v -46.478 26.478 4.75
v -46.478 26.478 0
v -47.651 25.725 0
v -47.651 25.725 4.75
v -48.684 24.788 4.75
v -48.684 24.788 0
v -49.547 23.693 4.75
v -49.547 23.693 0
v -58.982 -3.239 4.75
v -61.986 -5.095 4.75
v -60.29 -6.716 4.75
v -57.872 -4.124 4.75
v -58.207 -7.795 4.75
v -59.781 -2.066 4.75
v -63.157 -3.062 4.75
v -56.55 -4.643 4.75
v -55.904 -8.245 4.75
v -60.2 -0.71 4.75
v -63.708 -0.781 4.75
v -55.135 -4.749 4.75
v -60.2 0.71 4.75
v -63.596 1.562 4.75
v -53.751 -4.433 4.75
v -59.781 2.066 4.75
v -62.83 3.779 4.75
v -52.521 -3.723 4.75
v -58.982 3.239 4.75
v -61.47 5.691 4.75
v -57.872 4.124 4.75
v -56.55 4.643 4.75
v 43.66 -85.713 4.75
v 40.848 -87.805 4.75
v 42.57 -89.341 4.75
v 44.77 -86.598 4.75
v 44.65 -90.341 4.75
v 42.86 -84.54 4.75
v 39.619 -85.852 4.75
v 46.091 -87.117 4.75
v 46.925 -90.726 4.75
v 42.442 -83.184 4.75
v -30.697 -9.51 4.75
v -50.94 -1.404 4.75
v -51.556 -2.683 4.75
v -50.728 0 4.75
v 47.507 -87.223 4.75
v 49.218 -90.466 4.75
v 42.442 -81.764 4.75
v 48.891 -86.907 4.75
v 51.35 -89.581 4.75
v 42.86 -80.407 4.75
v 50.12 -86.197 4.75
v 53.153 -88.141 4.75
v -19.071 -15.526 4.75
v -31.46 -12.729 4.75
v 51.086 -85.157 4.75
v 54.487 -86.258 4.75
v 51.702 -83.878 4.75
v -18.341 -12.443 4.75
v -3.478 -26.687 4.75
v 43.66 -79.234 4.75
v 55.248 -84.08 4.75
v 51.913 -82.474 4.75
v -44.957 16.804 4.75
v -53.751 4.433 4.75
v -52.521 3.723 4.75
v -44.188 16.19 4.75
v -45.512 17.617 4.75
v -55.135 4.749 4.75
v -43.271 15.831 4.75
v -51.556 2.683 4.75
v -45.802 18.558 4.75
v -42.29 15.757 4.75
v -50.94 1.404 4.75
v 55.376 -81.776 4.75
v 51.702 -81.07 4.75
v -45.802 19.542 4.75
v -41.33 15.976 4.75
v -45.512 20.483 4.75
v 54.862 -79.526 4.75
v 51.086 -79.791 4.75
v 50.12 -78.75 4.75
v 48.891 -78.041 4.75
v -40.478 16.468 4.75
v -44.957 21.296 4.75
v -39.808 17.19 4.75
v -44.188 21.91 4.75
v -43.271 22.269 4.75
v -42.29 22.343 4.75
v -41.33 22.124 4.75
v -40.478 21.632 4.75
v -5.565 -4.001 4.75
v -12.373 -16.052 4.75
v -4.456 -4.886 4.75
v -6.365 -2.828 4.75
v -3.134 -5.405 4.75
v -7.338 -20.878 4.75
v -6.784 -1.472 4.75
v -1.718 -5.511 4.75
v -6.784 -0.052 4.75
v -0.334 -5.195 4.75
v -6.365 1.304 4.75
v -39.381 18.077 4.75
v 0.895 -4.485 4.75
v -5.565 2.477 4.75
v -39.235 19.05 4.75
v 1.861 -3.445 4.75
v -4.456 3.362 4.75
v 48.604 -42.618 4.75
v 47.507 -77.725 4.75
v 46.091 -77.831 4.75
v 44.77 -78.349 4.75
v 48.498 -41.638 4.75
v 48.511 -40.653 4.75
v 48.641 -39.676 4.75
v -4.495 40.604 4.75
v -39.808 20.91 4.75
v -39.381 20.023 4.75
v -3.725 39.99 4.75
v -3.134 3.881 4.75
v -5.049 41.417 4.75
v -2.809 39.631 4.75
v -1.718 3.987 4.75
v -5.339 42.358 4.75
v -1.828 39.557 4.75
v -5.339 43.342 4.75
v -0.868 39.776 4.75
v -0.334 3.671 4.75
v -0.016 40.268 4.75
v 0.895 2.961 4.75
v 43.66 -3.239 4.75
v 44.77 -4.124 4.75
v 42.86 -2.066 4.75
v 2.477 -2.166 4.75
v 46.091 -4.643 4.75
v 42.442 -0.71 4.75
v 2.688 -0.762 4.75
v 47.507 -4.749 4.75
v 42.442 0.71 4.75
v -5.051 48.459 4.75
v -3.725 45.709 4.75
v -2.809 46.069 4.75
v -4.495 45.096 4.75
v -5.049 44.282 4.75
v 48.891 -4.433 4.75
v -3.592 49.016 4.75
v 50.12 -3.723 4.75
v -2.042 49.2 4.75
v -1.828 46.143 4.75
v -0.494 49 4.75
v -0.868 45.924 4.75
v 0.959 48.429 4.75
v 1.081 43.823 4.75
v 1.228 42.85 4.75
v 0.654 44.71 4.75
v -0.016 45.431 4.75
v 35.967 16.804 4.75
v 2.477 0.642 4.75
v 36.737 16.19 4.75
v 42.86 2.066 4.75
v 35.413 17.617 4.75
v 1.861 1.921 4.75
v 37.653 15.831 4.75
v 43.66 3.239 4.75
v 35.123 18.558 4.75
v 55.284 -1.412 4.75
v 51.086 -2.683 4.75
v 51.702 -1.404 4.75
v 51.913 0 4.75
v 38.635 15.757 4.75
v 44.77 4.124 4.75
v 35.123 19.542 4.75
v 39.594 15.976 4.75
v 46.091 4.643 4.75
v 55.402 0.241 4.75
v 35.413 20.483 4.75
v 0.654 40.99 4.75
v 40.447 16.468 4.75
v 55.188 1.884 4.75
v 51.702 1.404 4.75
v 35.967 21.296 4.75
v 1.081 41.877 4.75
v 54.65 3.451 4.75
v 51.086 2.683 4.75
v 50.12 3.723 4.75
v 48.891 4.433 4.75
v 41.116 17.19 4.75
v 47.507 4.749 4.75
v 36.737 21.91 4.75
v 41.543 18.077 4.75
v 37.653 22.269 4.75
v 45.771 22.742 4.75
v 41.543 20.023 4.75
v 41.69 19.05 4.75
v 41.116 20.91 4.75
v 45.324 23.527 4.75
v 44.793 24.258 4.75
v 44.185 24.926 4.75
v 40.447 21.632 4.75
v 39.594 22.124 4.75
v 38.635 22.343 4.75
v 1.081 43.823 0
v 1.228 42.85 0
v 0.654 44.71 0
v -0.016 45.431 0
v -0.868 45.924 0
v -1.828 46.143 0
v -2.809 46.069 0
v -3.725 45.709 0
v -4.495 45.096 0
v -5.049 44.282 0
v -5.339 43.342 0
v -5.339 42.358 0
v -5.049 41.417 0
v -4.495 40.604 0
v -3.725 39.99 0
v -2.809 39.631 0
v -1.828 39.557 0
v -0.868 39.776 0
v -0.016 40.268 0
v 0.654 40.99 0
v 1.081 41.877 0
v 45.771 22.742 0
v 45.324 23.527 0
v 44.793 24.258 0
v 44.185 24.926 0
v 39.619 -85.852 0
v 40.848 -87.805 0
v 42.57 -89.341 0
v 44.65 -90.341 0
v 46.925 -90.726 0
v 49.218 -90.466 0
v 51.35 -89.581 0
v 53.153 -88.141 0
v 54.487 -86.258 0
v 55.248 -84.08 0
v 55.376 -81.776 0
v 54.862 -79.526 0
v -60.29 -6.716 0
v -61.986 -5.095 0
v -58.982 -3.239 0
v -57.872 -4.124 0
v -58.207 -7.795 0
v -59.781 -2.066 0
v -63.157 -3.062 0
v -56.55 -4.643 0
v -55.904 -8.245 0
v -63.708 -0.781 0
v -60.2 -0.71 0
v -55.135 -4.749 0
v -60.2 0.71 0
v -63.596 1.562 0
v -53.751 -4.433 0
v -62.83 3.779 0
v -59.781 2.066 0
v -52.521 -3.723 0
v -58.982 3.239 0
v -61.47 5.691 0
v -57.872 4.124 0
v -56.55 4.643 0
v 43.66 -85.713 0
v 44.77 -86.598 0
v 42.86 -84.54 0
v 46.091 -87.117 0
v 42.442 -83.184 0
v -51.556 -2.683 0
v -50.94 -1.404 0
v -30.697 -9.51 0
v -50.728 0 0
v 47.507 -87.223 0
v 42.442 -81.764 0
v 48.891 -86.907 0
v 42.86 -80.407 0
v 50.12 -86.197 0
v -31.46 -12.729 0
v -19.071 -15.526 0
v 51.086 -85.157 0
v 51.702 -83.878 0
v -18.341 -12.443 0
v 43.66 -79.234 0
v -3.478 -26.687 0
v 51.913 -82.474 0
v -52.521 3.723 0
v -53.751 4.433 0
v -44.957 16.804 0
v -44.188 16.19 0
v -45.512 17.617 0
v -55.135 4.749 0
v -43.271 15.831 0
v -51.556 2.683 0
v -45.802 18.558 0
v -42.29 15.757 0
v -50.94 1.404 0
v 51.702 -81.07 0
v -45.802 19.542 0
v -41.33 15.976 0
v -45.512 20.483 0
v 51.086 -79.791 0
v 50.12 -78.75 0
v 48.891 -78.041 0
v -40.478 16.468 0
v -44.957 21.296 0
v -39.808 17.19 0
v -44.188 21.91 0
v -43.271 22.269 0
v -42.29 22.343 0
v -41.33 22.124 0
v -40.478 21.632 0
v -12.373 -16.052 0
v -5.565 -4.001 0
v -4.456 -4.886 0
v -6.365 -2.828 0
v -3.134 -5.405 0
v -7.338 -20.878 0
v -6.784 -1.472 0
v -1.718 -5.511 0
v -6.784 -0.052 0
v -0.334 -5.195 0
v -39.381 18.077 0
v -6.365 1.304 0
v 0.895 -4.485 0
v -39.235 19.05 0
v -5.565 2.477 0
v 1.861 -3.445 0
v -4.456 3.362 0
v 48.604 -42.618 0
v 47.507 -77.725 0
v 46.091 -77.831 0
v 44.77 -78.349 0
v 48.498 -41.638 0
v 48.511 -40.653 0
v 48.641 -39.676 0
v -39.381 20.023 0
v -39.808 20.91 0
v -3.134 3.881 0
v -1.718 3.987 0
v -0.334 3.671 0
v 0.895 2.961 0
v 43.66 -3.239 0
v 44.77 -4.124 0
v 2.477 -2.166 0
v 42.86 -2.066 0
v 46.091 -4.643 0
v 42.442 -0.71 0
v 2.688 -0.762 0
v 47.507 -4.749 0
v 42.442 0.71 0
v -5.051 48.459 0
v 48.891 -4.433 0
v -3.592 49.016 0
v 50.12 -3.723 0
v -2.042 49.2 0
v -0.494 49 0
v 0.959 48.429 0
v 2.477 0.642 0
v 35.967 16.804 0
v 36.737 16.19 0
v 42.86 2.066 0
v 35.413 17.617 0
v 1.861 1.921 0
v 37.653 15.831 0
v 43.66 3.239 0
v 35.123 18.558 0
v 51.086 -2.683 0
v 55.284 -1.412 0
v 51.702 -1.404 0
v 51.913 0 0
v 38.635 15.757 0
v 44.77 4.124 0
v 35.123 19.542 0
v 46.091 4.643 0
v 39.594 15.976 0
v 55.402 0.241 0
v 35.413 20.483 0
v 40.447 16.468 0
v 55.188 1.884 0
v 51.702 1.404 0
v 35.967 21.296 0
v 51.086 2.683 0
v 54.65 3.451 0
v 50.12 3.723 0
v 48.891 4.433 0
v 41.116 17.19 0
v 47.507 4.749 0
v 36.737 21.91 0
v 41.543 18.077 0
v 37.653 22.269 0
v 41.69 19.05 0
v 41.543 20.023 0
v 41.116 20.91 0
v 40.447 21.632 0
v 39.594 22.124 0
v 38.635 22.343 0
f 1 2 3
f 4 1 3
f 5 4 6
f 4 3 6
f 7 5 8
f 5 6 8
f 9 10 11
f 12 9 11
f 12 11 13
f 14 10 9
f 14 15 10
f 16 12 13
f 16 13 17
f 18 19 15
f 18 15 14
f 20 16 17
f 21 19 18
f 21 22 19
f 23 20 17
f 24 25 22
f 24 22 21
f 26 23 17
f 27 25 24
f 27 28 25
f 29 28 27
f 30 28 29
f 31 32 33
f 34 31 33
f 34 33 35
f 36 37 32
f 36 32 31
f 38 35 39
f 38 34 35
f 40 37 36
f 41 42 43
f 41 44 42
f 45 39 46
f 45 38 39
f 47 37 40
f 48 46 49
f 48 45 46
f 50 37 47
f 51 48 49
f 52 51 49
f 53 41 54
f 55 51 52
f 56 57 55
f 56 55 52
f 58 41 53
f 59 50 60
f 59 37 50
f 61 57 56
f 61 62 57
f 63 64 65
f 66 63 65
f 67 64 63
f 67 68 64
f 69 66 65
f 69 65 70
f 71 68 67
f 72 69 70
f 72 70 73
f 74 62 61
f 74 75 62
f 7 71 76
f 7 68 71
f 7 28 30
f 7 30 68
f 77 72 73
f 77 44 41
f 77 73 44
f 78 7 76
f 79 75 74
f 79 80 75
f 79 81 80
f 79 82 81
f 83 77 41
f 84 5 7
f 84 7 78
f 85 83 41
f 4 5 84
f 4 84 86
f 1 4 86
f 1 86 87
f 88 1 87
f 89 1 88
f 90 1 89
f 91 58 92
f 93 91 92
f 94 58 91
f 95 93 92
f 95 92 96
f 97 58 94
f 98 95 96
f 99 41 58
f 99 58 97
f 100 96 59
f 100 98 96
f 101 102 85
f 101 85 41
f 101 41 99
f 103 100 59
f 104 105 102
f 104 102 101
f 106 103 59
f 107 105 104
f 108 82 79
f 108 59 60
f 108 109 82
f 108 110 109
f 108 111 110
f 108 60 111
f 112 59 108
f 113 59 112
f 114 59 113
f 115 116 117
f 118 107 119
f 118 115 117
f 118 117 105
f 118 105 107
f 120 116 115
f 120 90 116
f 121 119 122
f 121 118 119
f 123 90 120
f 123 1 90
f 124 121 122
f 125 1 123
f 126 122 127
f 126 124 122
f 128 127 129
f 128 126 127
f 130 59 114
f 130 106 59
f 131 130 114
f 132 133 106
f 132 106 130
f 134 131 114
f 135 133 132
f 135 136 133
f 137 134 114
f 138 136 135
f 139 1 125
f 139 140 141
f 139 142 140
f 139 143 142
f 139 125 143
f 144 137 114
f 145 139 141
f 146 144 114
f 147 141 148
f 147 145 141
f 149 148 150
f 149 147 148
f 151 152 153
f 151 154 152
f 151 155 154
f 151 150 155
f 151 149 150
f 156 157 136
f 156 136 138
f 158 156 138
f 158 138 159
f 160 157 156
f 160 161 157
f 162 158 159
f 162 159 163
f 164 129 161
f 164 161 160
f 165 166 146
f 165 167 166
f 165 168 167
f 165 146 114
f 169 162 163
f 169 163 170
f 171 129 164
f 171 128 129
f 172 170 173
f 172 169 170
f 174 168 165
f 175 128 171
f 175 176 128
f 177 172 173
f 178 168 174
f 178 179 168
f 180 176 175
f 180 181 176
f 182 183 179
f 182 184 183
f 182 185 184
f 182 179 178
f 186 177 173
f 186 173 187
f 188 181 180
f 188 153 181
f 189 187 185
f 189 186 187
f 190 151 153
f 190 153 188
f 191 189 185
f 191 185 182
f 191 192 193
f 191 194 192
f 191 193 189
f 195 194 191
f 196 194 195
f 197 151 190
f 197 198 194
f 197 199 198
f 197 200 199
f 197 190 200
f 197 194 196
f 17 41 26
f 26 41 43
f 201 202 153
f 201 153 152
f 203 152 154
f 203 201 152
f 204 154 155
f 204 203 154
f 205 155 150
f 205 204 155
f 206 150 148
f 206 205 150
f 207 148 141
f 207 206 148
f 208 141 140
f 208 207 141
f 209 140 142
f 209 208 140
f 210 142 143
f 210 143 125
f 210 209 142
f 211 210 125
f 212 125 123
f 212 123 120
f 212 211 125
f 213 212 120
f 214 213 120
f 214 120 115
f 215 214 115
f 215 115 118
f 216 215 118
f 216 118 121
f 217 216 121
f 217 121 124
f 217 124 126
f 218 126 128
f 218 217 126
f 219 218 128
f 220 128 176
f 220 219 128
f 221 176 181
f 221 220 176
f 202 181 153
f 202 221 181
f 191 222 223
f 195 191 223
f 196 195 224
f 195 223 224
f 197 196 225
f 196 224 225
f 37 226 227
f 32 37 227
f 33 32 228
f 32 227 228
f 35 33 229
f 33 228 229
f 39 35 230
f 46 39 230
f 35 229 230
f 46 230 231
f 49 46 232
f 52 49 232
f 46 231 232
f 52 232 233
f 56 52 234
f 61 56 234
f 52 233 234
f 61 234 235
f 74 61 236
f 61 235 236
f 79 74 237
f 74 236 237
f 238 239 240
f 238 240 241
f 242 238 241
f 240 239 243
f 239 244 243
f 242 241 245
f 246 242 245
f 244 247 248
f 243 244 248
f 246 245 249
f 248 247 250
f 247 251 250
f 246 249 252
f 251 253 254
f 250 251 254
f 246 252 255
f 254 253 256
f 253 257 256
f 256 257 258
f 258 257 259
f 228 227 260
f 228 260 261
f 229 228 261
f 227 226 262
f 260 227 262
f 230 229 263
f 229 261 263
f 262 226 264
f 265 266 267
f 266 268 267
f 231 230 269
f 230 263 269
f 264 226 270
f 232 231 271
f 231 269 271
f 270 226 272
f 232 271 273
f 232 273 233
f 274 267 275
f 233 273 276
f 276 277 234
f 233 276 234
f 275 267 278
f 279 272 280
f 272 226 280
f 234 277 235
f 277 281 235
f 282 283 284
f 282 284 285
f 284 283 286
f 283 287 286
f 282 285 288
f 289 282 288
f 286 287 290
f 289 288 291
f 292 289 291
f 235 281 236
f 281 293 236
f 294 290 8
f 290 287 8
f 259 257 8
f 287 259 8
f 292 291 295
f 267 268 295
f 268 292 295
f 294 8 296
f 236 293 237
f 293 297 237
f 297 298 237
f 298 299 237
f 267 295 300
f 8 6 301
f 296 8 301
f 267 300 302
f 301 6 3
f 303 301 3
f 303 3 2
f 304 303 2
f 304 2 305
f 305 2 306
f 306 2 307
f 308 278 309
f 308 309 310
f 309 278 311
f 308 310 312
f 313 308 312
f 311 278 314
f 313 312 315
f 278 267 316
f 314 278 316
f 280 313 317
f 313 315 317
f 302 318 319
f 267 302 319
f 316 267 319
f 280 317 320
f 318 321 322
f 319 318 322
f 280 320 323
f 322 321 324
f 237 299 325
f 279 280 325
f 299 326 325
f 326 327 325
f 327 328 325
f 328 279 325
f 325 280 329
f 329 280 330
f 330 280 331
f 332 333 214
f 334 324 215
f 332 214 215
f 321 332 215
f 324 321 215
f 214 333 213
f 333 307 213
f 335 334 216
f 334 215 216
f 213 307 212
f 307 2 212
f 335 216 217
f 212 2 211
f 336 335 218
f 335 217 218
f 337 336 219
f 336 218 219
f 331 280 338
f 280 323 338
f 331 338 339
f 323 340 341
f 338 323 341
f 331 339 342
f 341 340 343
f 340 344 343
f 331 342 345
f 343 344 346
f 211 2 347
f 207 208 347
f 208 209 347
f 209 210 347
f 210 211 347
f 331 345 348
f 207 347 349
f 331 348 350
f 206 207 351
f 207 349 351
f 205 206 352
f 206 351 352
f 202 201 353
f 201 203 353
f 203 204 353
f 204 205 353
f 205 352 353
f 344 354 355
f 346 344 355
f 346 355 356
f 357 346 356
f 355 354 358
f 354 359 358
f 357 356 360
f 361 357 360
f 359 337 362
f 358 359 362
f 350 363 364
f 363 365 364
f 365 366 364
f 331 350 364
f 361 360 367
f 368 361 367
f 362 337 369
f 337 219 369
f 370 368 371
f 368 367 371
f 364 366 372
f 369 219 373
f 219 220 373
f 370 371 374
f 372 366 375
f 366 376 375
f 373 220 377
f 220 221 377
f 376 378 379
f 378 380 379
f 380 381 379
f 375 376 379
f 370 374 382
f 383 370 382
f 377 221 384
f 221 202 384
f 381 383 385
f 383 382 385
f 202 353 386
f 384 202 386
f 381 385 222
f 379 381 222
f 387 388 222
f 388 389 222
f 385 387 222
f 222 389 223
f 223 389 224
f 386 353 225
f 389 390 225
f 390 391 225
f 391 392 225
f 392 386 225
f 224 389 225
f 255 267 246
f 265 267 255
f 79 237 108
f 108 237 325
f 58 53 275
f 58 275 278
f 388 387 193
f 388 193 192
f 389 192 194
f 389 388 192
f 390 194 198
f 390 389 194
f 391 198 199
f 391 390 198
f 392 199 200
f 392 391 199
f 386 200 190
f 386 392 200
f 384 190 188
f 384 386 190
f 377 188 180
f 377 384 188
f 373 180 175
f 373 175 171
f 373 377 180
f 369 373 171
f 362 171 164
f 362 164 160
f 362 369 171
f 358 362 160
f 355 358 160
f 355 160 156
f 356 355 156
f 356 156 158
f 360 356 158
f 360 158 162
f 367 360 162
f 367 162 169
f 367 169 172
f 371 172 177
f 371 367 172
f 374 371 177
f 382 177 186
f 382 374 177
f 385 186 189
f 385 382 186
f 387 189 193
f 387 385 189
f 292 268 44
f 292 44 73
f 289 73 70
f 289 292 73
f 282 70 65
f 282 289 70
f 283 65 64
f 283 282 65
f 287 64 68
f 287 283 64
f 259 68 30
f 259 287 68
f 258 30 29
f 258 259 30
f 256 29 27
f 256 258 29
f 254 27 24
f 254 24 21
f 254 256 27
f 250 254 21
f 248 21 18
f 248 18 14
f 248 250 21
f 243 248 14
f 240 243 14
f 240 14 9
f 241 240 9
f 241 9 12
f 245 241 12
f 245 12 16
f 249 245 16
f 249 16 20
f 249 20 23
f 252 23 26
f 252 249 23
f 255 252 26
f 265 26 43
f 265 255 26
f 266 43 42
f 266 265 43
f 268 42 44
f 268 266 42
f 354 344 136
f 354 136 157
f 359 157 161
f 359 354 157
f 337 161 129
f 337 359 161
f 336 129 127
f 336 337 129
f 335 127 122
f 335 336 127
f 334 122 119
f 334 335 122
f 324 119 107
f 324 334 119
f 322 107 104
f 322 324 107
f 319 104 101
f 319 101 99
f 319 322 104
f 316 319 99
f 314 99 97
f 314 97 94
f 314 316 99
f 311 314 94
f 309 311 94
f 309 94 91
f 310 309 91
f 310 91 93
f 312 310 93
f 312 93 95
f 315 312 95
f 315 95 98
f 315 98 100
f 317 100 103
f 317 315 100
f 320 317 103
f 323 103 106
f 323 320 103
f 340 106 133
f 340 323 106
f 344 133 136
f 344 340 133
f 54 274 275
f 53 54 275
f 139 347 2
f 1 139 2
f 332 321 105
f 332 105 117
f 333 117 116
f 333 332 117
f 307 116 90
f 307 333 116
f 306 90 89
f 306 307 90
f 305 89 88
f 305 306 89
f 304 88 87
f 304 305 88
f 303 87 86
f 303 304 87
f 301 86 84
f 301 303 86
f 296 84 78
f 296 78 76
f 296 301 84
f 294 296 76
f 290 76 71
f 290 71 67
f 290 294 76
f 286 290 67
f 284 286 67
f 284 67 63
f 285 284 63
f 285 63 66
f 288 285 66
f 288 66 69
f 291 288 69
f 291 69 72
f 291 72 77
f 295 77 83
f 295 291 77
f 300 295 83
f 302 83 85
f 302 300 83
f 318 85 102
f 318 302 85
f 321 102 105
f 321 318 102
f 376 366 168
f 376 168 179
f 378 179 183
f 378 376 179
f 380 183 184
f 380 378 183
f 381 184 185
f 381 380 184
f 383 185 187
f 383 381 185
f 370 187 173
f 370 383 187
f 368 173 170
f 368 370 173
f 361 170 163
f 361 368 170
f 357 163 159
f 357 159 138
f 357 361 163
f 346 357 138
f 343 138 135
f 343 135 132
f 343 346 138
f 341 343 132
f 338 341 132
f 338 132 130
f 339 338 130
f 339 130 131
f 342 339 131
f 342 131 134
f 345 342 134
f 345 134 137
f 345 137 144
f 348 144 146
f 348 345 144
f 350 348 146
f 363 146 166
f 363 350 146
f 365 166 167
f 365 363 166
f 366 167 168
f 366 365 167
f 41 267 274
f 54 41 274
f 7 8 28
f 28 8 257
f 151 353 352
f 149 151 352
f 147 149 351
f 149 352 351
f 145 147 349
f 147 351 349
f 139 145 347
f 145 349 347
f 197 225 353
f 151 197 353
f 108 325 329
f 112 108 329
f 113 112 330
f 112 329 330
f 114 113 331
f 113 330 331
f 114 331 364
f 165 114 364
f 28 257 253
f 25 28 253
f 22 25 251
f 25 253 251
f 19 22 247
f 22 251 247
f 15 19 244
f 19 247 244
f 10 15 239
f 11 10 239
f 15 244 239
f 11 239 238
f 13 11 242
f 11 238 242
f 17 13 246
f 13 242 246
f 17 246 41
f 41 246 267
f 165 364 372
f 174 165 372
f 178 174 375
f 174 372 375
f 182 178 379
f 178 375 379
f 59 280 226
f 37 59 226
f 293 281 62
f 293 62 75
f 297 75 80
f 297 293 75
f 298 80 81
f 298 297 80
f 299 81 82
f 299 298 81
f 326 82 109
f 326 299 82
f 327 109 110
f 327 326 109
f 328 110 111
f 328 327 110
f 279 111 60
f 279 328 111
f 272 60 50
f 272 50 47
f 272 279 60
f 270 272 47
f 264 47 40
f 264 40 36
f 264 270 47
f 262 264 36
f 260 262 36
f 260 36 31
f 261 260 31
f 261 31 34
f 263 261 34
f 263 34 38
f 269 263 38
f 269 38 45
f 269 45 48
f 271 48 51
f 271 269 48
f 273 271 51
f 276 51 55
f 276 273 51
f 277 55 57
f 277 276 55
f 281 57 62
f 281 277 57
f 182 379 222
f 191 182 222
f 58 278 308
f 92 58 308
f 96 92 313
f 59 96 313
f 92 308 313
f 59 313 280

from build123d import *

# Parameters (mm, degrees)
F0_R     = 4.7625
F0_R_2   = 3.302
F1_DEPTH = 4.7498


with BuildPart() as f1:
    # F0 (on Top) → F1 (new body)
    with BuildSketch(Plane.XY):
        with BuildLine():
            Line((44.185468, 24.926487), (0.958828, 48.42856))
            ThreePointArc((0.958828, 48.42856), (-2.042016, 49.199718), (-5.050549, 48.459123))
            Line((-5.050549, 48.459123), (-46.477872, 26.478292))
            ThreePointArc((-46.477872, 26.478292), (-48.186948, 25.277873), (-49.547481, 23.69329))
            Line((-49.547481, 23.69329), (-61.470053, 5.69123))
            ThreePointArc((-61.470053, 5.69123), (-63.1567, -3.061793), (-55.904223, -8.244627))
            Line((-55.904223, -8.244627), (-30.697283, -9.509502))
            Line((-30.697283, -9.509502), (-31.459969, -12.728965))
            Line((-31.459969, -12.728965), (-19.071049, -15.525871))
            Line((-19.071049, -15.525871), (-18.340647, -12.442686))
            ThreePointArc((-18.340647, -12.442686), (-9.722602, -18.326584), (-3.477553, -26.686626))
            Line((-3.477553, -26.686626), (39.618722, -85.851888))
            ThreePointArc((39.618722, -85.851888), (50.31508, -90.098295), (54.861639, -79.526027))
            Line((54.861639, -79.526027), (48.604056, -42.618147))
            ThreePointArc((48.604056, -42.618147), (48.489523, -41.145608), (48.641425, -39.676454))
            Line((48.641425, -39.676454), (55.284238, -1.41197))
            ThreePointArc((55.284238, -1.41197), (55.336524, 1.067899), (54.649768, 3.451354))
            Line((54.649768, 3.451354), (45.771288, 22.741944))
            ThreePointArc((45.771288, 22.741944), (45.068278, 23.899477), (44.185468, 24.926487))
        make_face()
        with Locations((47.150889, -82.4738)):
            Circle(F0_R, mode=Mode.SUBTRACT)
        with Locations((-55.490511, 0)):
            Circle(F0_R, mode=Mode.SUBTRACT)
        with Locations((-42.536511, 19.05)):
            Circle(F0_R_2, mode=Mode.SUBTRACT)
        with Locations((-2.074311, -0.762)):
            Circle(F0_R, mode=Mode.SUBTRACT)
        with Locations((47.150889, 0)):
            Circle(F0_R, mode=Mode.SUBTRACT)
        with Locations((-2.074311, 42.8498)):
            Circle(F0_R_2, mode=Mode.SUBTRACT)
        with Locations((38.387889, 19.05)):
            Circle(F0_R_2, mode=Mode.SUBTRACT)
    extrude(amount=F1_DEPTH)


solid = f1.part
